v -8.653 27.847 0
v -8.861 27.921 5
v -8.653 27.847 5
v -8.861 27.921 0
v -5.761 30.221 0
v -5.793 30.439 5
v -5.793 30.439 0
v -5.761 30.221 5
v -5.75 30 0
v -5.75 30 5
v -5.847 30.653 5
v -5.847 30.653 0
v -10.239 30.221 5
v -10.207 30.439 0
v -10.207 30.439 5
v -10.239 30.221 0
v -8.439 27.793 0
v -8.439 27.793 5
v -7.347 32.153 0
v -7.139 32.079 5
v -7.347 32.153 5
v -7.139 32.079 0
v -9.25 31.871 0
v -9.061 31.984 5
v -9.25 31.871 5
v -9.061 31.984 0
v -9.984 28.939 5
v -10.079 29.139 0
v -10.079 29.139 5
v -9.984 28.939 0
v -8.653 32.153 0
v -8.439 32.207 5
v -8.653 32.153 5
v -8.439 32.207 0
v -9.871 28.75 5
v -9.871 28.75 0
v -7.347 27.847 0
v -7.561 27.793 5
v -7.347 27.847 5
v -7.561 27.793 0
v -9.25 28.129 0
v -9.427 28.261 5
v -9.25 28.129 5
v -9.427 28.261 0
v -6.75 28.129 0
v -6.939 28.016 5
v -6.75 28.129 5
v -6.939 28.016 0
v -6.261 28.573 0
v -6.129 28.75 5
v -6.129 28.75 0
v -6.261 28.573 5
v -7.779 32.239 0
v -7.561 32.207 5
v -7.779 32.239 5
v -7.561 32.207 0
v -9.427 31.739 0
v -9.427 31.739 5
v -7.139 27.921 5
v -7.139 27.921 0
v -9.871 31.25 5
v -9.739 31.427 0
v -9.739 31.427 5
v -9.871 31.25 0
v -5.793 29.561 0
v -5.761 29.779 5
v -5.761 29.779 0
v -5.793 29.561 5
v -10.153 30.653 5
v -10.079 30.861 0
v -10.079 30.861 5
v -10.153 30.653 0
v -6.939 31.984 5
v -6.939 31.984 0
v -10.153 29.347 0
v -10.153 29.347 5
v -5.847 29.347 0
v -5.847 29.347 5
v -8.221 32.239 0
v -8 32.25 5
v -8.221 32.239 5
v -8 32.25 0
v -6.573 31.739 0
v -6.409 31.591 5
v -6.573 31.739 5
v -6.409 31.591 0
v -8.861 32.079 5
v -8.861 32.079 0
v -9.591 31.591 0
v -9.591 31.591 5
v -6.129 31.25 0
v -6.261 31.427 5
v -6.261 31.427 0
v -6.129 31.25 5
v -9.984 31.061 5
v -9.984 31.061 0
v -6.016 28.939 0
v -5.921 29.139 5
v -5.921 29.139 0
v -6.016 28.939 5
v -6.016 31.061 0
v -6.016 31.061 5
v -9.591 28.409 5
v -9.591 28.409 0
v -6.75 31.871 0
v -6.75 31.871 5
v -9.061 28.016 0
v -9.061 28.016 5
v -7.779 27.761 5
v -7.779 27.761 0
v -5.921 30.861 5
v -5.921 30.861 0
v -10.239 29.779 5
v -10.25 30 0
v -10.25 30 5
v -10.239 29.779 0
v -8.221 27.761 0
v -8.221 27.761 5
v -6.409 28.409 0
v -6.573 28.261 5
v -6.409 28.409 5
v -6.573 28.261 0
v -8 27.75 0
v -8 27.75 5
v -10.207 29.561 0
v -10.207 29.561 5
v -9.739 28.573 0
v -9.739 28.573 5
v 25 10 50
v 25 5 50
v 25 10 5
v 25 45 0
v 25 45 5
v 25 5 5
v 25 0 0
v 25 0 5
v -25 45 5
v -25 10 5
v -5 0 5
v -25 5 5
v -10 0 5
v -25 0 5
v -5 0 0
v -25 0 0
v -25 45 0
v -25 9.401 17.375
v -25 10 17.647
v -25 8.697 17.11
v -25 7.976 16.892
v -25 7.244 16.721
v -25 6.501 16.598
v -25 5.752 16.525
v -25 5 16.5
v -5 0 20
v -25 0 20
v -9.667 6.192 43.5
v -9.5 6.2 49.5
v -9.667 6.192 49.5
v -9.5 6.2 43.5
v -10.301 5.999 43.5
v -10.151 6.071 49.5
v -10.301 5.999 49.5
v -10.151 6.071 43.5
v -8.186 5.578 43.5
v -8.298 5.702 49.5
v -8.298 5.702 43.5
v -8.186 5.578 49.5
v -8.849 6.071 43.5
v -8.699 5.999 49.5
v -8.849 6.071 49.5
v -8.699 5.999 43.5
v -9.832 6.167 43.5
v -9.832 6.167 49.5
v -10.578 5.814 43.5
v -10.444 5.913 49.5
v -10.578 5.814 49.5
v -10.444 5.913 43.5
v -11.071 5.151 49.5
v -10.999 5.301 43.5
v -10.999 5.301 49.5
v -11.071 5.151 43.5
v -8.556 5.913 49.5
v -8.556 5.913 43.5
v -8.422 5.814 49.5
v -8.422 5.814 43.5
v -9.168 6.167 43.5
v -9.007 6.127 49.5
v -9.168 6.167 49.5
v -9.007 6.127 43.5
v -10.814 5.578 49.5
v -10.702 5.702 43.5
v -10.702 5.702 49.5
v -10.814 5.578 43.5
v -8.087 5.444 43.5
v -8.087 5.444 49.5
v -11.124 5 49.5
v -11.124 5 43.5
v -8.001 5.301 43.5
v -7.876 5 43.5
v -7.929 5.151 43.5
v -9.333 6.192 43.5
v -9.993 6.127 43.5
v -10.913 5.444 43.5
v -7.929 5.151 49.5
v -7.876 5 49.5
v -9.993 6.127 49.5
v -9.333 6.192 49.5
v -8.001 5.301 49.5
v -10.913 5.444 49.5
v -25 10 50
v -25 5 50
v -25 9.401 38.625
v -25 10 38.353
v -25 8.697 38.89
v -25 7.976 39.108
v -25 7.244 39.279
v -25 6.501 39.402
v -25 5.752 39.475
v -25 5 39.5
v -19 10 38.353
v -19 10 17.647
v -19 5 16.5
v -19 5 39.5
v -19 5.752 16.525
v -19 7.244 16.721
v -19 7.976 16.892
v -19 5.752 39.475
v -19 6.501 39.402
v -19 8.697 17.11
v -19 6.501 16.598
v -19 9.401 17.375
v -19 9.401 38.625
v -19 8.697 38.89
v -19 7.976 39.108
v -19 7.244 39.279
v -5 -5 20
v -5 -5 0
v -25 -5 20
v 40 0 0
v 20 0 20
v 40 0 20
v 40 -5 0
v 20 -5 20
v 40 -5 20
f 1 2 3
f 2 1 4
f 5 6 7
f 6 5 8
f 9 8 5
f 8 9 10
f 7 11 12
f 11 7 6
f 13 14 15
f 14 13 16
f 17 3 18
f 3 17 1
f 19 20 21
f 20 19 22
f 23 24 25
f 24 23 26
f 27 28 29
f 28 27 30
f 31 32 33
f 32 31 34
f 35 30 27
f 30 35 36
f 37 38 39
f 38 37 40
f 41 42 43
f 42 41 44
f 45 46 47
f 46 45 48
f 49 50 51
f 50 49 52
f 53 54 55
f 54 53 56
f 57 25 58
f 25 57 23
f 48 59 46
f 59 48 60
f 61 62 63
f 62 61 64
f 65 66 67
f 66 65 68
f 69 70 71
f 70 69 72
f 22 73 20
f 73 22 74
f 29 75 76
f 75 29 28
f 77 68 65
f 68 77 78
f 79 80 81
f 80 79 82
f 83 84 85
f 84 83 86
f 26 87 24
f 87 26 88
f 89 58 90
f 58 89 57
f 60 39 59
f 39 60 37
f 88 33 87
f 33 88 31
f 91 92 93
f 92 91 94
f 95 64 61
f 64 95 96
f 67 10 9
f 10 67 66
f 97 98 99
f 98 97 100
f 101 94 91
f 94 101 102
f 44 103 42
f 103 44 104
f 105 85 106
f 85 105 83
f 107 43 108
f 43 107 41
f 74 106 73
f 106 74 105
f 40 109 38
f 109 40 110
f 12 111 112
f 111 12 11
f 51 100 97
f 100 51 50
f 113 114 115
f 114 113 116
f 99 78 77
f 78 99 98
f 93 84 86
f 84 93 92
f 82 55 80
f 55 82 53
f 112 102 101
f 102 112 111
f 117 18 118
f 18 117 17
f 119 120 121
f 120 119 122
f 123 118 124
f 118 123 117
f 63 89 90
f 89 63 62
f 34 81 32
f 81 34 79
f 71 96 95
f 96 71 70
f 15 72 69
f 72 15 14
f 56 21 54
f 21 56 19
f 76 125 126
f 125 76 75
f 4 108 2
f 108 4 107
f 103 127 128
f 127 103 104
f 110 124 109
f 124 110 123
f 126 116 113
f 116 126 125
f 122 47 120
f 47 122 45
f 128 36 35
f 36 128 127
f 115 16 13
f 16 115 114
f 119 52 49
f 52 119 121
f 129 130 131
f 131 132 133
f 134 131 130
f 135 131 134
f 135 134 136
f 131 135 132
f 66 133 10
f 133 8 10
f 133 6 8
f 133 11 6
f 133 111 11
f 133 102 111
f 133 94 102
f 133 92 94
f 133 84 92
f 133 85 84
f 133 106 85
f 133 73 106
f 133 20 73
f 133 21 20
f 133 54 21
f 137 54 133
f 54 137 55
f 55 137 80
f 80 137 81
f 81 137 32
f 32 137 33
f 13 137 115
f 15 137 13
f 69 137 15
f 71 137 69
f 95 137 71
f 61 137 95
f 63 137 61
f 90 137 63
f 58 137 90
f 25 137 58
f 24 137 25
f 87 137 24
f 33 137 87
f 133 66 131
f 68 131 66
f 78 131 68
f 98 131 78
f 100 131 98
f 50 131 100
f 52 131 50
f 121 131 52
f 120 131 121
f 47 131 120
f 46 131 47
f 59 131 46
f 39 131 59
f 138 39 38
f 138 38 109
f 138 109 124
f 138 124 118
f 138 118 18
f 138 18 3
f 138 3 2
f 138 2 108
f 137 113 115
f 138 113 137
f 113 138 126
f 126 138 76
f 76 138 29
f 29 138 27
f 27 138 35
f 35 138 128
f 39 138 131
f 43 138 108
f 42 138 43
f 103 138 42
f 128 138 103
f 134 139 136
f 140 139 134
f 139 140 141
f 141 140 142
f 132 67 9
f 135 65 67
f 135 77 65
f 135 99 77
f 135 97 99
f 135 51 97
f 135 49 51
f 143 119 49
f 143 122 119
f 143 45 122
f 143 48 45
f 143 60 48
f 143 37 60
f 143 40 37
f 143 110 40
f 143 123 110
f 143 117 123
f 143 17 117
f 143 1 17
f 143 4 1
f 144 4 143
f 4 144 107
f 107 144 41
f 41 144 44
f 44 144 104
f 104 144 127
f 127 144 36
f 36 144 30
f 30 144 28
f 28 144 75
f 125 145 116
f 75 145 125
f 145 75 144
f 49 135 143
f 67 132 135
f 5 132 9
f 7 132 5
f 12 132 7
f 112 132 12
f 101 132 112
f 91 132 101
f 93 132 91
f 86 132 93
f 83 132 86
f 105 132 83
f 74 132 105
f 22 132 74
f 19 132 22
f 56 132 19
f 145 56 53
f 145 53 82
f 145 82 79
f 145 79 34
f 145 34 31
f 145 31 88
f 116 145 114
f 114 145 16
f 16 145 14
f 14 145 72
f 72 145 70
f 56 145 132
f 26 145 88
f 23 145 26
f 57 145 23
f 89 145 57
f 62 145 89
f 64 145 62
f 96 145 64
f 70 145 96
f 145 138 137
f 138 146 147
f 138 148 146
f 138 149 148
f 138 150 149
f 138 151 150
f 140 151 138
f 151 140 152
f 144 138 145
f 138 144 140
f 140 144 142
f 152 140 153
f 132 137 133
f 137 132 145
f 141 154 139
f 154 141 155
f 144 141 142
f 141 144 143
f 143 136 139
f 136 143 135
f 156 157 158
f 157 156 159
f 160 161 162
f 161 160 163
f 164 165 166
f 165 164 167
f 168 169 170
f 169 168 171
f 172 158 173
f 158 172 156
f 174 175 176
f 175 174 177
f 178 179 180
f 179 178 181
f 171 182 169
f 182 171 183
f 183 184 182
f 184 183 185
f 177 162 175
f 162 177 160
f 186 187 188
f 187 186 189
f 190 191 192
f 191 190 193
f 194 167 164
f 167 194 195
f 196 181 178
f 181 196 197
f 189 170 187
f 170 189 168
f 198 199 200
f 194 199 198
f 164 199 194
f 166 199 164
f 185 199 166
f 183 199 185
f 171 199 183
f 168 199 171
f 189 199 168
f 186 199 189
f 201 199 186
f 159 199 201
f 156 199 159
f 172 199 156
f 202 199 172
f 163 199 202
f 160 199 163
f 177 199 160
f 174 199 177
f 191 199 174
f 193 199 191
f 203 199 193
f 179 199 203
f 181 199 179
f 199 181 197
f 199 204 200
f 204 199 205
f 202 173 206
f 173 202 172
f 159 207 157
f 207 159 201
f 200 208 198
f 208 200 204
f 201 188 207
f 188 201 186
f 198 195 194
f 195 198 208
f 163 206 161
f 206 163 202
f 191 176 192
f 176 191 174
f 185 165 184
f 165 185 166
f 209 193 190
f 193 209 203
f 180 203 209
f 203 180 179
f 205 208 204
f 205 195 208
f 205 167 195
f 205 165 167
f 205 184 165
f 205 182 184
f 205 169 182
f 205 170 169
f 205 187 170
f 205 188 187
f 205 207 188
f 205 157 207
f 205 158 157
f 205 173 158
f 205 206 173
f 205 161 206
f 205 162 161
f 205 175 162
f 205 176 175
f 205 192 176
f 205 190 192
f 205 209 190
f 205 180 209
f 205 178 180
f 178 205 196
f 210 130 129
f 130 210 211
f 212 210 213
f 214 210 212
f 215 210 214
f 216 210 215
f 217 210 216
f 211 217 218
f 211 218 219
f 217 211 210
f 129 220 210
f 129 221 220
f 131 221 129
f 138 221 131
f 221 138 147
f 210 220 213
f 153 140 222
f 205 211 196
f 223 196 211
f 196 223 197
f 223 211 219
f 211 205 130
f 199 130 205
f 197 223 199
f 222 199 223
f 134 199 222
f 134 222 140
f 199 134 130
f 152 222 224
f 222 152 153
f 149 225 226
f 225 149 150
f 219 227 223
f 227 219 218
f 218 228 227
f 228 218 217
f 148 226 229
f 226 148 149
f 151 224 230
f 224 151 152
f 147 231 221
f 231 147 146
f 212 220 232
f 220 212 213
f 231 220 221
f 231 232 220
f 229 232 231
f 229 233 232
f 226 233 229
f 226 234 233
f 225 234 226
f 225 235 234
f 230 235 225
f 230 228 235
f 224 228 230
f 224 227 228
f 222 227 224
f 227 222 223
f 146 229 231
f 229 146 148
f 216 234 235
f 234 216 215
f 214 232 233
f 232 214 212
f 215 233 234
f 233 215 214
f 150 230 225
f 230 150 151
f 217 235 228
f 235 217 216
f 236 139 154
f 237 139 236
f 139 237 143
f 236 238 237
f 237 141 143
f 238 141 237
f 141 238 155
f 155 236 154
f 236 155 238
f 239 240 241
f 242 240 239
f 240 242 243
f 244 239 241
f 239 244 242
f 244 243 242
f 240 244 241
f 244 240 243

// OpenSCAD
// L-shaped mounting bracket for NEMA 17 stepper motor (e.g. syringe pump)
// Print orientation: base plate on bed, motor plate builds upward in +Z

// ---------------- Parameters ----------------
$fn = 64;

// Base plate
base_x_min = -25;   // plate left edge (X)
base_x_max = 25;    // plate right edge (X)
base_y_min = 0;     // plate front edge (Y)
base_y_max = 45;    // plate back edge (Y)
base_z_max = 5;     // plate thickness (Z)
bolt_m4_x = -17;    // M4 hole X position (left side)
bolt_m4_y = 30;     // M4 hole Y position
bolt_m4_d = 4.5;    // M4 hole diameter

// Motor plate
motor_x_min = -25;  // plate left edge (X)
motor_x_max = 25;   // plate right edge (X)
motor_y_min = 0;    // plate front edge (Y)
motor_y_max = 5;    // plate depth into base (Y)
motor_z_max = 50;   // plate top height (Z)
boss_hole_d = 23;   // motor centring boss hole diameter
boss_hole_x = 0;    // boss hole centre X
boss_hole_z = 28;   // boss hole centre Z
screw_m3_d = 3.4;   // M3 screw hole diameter
screw_pattern = 31; // square pitch of M3 holes
screw_count = 4;    // number of M3 holes

// Gussets
gusset_t = 5;       // gusset thickness (along X)
gusset_leg = 20;    // right-triangle leg length (along Y and Z)
gusset_x0 = -25;    // left gusset start X
gusset_x1 = 20;     // right gusset start X

eps = 0.5;          // cutter overshoot past faces

// ---------------- Model ----------------
union() {
    // Base plate with M4 through-holes
    translate([base_x_min, base_y_min, 0])
        difference() {
            cube([base_x_max - base_x_min, base_y_max - base_y_min, base_z_max]);
            for (sx = [-1, 1])
                translate([sx * bolt_m4_x, bolt_m4_y, -eps])
                    cylinder(d = bolt_m4_d, h = base_z_max + 2 * eps);
        }

    // Motor plate standing on back edge of base, with boss hole and M3 screws
    translate([motor_x_min, motor_y_max - motor_y_min, 0])
        difference() {
            cube([motor_x_max - motor_x_min, motor_y_max - motor_y_min, motor_z_max]);
            // Boss hole along Y, centred at given X and Z
            translate([boss_hole_x, 0, boss_hole_z])
                rotate([0, 90, 0])
                    cylinder(d = boss_hole_d, h = motor_y_max - motor_y_min + 2 * eps, $fn = 96);
            // M3 screw holes on square pattern centred on boss hole
            for (i = [0 : screw_count - 1]) {
                a = (i - (screw_count - 1) / 2) * screw_pattern;
                translate([boss_hole_x + a, -eps, boss_hole_z + a])
                    cylinder(d = screw_m3_d, h = motor_y_max - motor_y_min + 2 * eps);
            }
        }

    // Triangular gussets flush with left and right edges
    for (gx = [gusset_x0, gusset_x1]) {
        translate([gx, 0, 0])
            rotate([90, 0, 0])
                linear_extrude(height = gusset_t)
                    polygon(points = [
                        [gusset_leg, gusset_leg],   // right-angle corner at y=5, z=5
                        [gusset_leg, 0],
                        [0, gusset_leg]
                    ]);
    }
}
